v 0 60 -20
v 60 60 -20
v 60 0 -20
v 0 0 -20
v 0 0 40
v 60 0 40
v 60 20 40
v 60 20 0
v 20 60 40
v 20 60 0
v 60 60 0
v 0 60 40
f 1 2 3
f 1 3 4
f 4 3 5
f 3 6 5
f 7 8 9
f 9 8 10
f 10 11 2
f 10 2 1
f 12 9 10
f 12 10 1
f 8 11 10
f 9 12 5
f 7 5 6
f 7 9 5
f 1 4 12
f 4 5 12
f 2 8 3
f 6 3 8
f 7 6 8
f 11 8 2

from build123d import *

# Parameters (mm, degrees)
RESSALTO_EXTRUS_O1_DEPTH = 40
ESBO_O2_W                = 60
ESBO_O2_H                = 60
RESSALTO_EXTRUS_O2_DEPTH = 20


with BuildPart() as part:
    # Esboço1 → Ressalto-extrusão1 (new body)
    with BuildSketch(Plane.XY):
        Polygon((0, 0), (60, 0), (60, 20), (20, 60), (0, 60), align=None)
    extrude(amount=RESSALTO_EXTRUS_O1_DEPTH)

    # Esboço2 → Ressalto-extrusão2 (add)
    with BuildSketch(Plane(origin=(0, 0, 0), x_dir=(-1, 0, 0), z_dir=(0, 0, -1))):
        with Locations((-30, 30)):
            Rectangle(ESBO_O2_W, ESBO_O2_H)
    extrude(amount=RESSALTO_EXTRUS_O2_DEPTH)


solid = part.part
